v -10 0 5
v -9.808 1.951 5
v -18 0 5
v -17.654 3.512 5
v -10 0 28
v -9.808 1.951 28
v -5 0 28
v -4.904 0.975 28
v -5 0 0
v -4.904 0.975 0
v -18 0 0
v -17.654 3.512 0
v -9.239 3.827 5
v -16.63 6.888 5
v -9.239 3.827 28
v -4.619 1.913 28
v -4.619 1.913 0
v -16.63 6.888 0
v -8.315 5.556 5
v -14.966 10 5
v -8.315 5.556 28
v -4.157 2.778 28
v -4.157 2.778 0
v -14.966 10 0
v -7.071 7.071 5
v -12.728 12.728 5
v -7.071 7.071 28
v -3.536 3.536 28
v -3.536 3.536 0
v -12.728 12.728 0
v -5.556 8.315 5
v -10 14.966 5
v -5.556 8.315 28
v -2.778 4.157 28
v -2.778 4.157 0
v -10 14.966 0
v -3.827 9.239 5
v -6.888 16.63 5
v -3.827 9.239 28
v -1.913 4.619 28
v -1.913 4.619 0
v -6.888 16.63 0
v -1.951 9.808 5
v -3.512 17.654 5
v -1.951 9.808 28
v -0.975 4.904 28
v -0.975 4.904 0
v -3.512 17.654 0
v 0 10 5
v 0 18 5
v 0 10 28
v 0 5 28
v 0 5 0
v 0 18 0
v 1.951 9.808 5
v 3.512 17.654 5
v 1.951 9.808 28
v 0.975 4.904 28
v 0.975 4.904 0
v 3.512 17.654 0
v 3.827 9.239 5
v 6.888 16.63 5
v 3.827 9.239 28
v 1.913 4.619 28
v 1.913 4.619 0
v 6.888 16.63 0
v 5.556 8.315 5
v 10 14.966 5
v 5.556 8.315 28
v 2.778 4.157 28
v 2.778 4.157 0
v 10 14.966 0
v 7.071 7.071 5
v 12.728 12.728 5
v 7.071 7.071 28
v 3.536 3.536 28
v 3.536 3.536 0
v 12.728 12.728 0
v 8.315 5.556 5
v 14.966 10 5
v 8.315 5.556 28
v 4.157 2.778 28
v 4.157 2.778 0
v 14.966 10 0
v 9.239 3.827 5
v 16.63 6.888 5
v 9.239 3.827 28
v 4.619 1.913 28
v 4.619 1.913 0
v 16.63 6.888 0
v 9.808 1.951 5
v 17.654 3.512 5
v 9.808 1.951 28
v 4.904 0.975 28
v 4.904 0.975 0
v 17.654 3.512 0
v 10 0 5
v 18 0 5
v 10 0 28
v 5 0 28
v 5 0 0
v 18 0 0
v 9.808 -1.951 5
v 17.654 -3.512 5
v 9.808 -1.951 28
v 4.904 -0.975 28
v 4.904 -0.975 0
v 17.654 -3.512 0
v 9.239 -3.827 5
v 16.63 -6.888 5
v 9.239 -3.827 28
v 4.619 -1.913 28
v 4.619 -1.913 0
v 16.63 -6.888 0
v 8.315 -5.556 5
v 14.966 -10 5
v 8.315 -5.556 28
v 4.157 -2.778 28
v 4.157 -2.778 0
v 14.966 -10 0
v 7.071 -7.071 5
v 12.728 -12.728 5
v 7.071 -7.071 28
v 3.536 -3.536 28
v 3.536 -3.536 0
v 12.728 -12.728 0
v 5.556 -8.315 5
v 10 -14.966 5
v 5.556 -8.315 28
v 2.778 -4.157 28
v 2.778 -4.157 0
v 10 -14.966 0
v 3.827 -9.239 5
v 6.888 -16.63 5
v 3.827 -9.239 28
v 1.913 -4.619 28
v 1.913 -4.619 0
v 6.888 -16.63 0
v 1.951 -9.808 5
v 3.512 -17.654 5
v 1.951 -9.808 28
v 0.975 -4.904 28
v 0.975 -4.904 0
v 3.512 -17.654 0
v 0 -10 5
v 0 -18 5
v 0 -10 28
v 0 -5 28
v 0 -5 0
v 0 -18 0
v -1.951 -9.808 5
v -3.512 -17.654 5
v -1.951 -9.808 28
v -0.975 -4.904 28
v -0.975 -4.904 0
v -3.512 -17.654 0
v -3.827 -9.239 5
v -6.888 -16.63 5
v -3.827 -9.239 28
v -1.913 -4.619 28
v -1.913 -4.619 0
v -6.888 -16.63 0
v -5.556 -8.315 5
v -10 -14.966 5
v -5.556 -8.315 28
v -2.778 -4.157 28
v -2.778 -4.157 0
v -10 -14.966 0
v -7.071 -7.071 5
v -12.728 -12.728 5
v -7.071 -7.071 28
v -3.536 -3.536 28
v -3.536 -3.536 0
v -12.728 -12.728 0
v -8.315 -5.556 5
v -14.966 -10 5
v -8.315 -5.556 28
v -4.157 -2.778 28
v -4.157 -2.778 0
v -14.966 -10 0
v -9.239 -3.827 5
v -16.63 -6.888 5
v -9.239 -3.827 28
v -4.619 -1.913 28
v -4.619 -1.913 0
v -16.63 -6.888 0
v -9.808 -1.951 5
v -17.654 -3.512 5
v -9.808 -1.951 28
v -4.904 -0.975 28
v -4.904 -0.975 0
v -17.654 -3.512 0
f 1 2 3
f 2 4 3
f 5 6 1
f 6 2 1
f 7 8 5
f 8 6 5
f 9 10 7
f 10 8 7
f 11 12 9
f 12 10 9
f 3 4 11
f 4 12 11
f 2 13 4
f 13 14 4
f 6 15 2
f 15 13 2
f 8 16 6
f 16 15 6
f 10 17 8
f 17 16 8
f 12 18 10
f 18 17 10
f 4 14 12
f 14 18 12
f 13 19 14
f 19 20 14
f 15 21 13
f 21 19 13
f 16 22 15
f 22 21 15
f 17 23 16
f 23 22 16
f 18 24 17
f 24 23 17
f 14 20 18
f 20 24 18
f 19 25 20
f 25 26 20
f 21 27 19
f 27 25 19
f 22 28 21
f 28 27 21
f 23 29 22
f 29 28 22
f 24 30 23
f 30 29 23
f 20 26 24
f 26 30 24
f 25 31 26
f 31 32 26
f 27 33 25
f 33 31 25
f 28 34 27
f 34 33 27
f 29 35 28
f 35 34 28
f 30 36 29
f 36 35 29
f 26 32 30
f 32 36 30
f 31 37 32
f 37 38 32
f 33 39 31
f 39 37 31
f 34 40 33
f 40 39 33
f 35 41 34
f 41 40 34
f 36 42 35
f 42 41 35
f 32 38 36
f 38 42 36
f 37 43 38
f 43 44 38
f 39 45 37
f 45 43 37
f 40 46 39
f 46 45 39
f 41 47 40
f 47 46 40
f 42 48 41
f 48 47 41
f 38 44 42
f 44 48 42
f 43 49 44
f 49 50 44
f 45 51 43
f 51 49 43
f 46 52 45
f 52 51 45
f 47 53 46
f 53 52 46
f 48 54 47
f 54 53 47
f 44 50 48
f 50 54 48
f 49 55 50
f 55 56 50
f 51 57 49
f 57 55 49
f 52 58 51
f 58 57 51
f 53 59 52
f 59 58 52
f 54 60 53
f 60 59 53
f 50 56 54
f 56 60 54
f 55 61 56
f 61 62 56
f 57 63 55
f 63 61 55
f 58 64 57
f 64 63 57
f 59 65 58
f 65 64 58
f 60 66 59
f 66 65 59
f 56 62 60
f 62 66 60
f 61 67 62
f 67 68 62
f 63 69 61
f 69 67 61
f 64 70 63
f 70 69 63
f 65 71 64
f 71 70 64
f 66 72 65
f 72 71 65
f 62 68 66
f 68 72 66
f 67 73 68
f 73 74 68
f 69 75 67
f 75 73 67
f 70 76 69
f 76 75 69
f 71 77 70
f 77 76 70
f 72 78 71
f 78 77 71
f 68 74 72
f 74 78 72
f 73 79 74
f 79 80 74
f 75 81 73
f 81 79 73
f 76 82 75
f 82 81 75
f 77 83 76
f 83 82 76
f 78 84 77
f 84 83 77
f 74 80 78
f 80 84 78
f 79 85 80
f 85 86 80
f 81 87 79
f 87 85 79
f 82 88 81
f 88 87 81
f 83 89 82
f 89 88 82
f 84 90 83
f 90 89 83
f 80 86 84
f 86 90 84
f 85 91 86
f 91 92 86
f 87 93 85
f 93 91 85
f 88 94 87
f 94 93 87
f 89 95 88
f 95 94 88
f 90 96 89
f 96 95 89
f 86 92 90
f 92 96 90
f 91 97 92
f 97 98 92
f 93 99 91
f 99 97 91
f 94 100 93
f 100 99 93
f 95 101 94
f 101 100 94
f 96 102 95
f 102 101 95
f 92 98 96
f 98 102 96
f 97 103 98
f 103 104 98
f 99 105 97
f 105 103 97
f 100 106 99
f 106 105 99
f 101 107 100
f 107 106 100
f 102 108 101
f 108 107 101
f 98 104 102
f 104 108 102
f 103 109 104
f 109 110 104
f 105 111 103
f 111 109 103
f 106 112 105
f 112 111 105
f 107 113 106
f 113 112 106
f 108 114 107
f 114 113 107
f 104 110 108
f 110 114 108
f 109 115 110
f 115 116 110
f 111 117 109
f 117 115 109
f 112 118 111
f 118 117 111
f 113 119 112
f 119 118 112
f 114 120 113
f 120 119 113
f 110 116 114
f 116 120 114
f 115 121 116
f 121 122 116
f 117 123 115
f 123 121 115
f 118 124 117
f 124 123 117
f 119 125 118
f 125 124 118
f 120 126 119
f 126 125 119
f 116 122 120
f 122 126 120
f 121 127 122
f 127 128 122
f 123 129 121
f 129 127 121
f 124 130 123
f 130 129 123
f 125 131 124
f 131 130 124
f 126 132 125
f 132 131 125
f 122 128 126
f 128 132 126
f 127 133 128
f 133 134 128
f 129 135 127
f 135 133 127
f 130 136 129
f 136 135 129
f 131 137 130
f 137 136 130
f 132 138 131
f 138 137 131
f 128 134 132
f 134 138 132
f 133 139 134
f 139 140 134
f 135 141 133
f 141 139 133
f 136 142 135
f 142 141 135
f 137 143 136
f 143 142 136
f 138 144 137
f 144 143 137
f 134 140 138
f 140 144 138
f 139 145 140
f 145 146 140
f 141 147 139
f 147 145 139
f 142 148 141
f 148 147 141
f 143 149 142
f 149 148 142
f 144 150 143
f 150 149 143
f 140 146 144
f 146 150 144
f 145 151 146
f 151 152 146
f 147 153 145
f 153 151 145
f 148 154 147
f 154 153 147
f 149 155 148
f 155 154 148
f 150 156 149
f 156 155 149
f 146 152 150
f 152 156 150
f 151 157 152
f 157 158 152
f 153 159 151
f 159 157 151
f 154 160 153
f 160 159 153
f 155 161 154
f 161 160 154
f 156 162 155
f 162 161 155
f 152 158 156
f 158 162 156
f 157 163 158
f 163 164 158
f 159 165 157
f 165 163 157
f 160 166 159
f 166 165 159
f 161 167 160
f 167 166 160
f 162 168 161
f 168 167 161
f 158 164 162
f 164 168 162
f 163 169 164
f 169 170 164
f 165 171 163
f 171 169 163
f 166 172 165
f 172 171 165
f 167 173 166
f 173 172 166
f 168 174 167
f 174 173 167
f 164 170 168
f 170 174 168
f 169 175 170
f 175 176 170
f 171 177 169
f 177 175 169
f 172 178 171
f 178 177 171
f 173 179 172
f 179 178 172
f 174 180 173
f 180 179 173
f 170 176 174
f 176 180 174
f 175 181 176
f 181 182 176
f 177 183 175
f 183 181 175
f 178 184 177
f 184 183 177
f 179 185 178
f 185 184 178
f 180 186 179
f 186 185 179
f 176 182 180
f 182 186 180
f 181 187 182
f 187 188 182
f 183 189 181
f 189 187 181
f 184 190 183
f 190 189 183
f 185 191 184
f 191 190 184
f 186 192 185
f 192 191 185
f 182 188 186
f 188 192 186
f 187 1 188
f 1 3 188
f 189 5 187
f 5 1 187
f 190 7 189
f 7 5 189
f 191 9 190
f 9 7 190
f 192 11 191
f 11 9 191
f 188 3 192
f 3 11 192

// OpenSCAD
$fn = 32;

// ----------------------------------------------------------------------
// Revolved part: flanged bushing R18
// ----------------------------------------------------------------------

// --- parameters (mm) ---
bore_r = 5;               // bore radius
flange_r = 18;            // flange radius
flange_h = 5;             // flange thickness
sleeve_r = 10;            // sleeve radius
total_h = 28;             // overall height
revolve_angle = 360;      // revolve sweep, degrees

bore_d = 2 * bore_r;
flange_d = 2 * flange_r;
sleeve_d = 2 * sleeve_r;

profile = [[5, 0], [18, 0], [18, 5], [10, 5], [10, 28], [5, 28]];  // primary outline, 6 points, counter clockwise

// --- the one profile operation ---
rotate_extrude(angle = revolve_angle) polygon(points = profile);
